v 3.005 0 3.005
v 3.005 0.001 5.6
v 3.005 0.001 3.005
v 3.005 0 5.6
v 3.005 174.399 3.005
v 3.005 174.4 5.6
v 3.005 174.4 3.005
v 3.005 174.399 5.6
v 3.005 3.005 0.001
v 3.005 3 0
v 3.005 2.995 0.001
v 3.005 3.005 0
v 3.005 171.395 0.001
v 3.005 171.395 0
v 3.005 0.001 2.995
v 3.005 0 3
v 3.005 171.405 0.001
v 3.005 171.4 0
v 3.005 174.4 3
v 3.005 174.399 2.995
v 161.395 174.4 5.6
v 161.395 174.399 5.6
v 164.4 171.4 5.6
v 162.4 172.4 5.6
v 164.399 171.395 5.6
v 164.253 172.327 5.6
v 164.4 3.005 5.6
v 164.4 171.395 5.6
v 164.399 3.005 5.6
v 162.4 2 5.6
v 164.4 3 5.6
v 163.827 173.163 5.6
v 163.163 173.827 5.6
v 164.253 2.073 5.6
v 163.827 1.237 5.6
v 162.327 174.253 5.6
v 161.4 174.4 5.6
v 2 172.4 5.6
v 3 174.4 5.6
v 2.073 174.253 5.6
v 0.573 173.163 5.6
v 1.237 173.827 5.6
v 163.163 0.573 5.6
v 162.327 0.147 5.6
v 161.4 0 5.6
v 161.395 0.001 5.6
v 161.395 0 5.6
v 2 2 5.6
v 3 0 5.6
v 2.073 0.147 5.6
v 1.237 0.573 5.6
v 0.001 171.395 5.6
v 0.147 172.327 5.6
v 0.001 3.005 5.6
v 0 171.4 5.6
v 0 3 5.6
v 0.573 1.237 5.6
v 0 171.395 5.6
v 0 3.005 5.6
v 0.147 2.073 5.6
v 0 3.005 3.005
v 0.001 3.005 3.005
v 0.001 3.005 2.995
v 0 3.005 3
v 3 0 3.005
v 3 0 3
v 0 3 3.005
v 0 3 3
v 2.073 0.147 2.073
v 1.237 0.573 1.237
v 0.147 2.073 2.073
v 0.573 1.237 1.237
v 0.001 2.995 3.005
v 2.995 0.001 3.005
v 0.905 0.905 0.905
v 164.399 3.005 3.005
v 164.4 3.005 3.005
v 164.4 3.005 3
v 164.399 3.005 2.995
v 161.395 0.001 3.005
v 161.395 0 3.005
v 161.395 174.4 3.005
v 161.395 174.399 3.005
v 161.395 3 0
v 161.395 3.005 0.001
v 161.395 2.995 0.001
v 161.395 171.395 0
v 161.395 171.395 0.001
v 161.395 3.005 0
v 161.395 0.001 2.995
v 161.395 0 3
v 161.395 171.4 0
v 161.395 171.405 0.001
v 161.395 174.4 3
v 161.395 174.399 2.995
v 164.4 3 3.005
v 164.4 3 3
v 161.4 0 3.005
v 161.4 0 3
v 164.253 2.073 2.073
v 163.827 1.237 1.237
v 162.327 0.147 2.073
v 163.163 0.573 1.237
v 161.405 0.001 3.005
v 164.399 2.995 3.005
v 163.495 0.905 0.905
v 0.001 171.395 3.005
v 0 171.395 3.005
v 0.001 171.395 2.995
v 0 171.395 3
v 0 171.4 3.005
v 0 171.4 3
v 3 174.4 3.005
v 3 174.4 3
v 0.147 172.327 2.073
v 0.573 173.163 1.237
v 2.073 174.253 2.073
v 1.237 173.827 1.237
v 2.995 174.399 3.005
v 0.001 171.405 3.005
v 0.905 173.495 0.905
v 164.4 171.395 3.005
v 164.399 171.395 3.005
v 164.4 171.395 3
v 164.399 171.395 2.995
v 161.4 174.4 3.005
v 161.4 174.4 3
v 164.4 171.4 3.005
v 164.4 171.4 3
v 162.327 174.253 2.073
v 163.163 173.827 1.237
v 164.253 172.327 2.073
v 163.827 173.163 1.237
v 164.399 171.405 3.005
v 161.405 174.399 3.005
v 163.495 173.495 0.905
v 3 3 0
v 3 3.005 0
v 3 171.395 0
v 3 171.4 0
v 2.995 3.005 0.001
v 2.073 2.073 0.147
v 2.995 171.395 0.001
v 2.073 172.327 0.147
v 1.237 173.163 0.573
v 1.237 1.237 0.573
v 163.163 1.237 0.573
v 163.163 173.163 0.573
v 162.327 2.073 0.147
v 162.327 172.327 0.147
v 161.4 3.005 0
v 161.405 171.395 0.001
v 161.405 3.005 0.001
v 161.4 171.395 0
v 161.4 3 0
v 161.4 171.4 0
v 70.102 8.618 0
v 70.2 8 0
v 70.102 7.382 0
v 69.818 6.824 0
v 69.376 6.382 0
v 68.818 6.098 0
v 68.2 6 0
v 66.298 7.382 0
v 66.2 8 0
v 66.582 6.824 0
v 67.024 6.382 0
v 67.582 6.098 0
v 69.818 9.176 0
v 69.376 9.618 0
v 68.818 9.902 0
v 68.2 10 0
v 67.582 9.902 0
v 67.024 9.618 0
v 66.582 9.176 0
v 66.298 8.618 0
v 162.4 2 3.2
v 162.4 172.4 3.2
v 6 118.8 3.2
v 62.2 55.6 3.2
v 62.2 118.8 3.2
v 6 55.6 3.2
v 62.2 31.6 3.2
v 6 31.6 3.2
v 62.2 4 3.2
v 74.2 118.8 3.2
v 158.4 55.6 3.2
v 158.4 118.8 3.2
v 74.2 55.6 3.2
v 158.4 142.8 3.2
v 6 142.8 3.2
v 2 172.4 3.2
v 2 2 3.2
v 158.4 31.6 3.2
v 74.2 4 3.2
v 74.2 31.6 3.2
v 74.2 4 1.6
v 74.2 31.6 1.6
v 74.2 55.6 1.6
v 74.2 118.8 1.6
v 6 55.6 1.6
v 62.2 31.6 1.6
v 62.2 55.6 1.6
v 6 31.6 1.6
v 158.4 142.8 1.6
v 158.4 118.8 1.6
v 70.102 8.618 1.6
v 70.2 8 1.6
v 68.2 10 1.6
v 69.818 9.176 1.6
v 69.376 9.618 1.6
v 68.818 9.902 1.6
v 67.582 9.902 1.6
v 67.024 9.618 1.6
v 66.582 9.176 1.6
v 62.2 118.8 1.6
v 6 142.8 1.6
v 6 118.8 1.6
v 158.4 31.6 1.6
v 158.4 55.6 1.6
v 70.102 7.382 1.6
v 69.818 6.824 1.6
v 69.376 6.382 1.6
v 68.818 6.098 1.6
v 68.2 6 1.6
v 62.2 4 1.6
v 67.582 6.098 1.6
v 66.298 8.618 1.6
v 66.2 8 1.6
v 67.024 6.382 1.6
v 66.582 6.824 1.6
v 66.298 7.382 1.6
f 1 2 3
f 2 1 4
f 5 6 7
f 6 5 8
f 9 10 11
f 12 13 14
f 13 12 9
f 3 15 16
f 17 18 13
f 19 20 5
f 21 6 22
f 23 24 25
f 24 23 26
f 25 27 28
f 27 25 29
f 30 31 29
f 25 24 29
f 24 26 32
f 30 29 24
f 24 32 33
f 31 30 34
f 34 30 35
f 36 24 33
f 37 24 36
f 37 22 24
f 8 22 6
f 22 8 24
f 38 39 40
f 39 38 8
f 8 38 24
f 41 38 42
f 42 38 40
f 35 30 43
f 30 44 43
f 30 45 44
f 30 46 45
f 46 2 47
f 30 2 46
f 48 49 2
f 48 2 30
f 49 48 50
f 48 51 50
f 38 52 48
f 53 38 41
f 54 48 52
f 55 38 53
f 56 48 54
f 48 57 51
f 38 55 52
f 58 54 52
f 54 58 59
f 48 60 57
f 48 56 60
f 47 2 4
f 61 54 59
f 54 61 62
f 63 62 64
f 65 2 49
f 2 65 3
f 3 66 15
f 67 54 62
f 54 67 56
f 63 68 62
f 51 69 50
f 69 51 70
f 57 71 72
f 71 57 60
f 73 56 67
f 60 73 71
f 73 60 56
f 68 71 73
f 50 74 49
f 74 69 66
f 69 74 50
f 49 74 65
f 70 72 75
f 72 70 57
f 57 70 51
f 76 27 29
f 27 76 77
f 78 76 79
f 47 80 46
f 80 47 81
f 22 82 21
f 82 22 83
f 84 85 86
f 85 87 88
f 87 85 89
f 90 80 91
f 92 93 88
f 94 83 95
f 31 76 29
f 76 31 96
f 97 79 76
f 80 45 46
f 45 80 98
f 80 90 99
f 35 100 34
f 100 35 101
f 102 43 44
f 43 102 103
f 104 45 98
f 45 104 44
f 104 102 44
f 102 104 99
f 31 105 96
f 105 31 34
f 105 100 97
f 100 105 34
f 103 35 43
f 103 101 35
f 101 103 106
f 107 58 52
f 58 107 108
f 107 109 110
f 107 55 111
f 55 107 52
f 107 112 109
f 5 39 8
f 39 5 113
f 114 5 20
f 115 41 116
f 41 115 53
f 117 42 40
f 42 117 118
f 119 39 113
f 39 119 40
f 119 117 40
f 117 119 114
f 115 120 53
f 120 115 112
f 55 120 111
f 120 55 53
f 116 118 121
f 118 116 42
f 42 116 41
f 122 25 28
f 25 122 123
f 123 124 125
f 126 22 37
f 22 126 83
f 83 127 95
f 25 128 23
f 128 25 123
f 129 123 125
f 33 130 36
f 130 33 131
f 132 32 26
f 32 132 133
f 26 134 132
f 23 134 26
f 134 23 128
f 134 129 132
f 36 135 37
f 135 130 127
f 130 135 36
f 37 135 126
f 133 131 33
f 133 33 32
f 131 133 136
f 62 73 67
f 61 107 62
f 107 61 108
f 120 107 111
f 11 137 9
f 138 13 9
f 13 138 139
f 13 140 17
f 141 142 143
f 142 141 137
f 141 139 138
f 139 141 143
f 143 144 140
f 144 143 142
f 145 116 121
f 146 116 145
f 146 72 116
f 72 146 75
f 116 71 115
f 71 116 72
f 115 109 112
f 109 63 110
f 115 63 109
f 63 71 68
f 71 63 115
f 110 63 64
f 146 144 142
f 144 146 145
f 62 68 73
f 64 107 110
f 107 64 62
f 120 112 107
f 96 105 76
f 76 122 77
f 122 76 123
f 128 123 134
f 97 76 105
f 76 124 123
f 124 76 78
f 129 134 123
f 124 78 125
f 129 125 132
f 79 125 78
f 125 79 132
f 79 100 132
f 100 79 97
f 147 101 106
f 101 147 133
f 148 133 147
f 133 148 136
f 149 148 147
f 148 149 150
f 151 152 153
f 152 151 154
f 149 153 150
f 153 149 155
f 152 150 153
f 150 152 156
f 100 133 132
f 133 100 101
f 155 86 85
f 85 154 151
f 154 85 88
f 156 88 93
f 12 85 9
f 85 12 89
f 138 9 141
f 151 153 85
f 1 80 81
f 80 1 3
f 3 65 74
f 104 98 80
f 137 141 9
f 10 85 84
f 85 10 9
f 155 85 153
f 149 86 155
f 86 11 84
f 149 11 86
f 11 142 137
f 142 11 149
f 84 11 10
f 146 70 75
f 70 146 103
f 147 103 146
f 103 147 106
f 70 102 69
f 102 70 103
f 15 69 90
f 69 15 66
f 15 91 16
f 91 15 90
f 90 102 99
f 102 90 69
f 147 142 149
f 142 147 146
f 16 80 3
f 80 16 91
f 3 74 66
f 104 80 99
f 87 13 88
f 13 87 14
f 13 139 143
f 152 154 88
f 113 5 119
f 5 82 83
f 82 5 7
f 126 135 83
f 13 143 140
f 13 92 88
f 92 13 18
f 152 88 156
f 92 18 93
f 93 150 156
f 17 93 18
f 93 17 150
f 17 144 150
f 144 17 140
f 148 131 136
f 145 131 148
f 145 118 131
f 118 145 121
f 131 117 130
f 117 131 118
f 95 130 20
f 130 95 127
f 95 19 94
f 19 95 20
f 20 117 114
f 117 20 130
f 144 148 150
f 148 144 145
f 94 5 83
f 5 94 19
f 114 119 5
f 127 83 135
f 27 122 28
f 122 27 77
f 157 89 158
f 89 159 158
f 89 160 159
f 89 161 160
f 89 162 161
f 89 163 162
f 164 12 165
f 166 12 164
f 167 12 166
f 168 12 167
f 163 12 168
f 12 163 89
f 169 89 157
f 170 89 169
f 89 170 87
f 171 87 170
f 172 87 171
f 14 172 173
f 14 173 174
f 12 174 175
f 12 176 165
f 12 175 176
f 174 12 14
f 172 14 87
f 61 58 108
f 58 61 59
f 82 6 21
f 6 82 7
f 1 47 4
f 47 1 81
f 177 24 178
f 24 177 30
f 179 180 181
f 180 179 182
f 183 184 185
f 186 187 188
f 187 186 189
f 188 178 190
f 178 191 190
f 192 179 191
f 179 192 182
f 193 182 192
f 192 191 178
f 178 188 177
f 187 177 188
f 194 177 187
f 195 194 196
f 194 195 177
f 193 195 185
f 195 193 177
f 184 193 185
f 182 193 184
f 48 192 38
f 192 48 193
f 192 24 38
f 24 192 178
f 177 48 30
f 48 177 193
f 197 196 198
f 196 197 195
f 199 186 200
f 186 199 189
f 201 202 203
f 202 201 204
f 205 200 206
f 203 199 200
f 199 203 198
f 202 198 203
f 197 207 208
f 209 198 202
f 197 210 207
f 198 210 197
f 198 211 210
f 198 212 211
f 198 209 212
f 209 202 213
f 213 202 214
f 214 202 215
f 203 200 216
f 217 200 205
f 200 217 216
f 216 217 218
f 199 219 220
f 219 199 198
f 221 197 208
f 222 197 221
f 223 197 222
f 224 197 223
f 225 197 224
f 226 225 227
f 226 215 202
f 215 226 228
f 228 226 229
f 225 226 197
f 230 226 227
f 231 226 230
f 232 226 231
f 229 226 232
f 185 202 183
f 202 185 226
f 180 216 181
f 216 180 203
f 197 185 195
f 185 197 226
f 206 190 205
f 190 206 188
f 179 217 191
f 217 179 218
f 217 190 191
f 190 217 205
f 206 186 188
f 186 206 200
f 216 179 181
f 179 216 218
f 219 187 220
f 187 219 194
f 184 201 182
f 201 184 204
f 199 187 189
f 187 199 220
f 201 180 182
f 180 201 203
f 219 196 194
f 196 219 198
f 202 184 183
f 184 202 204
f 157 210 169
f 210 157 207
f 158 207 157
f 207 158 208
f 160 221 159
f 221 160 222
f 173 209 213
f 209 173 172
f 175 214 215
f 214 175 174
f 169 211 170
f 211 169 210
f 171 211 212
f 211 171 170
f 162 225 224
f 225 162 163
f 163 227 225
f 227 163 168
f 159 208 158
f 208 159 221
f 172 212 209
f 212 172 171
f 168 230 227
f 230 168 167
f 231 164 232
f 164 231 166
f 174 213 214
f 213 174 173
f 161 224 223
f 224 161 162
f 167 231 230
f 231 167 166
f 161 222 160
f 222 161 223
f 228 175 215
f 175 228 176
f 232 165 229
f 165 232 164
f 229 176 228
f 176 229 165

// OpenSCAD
hole_size = 4;
side_wall = 2.0;
bottom_wall = 3.2;
touch_width = 160.4;
touch_length = 170.4;
touch_depth = 2.4;
wire_cut_depth = 4.0;
wire_cut_width = 12.0;
side_fillet_radius = 3.0;
bottom_fillet_radius = 3.0;

// Set the angular resolution ($fn segments per 360 deg)
$fn = 20;

box_height = bottom_wall + touch_depth;
box_width = touch_width+side_wall*2;
box_length = touch_length+side_wall*2;

module fillet(r, h) {
    translate([r / 2, r / 2, 0])
    difference() {
        cube([r + 0.01, r + 0.01, h], center = true);
        translate([r/2, r/2, 0])
          cylinder(r = r, h = h + 1, center = true);
    }
}

difference(){
    // Main box
    cube([box_width, box_length, box_height]);

    // cut-out the touch screen cavity
    //translate([side_wall+lip_width, side_wall+lip_width, bottom_wall])
    //  cube([trans_width-lip_width*2, trans_length-lip_width*2, box_height]);

    // cut for the touch screen
    translate([side_wall, side_wall, box_height-touch_depth])
      cube([touch_width, touch_length, touch_depth+0.1]);

    // outside cut for wires
    translate([box_width/2-20, side_wall*2, box_height-wire_cut_depth])
      cube([wire_cut_width, box_length*0.75-side_wall, wire_cut_depth*2]);

    // inside cut for wires
    translate([side_wall*3, box_length*0.75-wire_cut_width, box_height-wire_cut_depth])
      cube([box_width-side_wall*6, wire_cut_width*2, wire_cut_depth*2]);
    translate([side_wall*3, box_length*0.25-wire_cut_width, box_height-wire_cut_depth])
      cube([box_width-side_wall*6, wire_cut_width*2, wire_cut_depth*2]);

    // holes
    translate([wire_cut_width/2+box_width/2-20, side_wall*2+hole_size, -0.1])
      cylinder(r=hole_size/2, h=box_height);

    // fillets for the side edges
    fillet(side_fillet_radius, box_height*2);
    translate([box_width,0,0])
      rotate(a=[0,0,90])
        fillet(side_fillet_radius, box_height*2);
    translate([0,box_length,0])
      rotate(a=[0,0,270])
        fillet(side_fillet_radius, box_height*2);
    translate([box_width,box_length,0])
      rotate(a=[0,0,180])
        fillet(side_fillet_radius, box_height*2);

    // fillets for the two bottom length-wise edges
    rotate(a=[90,0,0])
      fillet(bottom_fillet_radius, box_length*2+.1);
    translate([box_width,0,0])
      rotate(a=[90,-90,0])
        fillet(bottom_fillet_radius, box_length*2+.1);
    // fillets for the two bottom width-wise edges
    rotate(a=[90,0,90])
      fillet(bottom_fillet_radius, box_width*2+.1);
    translate([0,box_length,0])
      rotate(a=[90,0,-90])
        fillet(bottom_fillet_radius, box_width*2+.1);
}
